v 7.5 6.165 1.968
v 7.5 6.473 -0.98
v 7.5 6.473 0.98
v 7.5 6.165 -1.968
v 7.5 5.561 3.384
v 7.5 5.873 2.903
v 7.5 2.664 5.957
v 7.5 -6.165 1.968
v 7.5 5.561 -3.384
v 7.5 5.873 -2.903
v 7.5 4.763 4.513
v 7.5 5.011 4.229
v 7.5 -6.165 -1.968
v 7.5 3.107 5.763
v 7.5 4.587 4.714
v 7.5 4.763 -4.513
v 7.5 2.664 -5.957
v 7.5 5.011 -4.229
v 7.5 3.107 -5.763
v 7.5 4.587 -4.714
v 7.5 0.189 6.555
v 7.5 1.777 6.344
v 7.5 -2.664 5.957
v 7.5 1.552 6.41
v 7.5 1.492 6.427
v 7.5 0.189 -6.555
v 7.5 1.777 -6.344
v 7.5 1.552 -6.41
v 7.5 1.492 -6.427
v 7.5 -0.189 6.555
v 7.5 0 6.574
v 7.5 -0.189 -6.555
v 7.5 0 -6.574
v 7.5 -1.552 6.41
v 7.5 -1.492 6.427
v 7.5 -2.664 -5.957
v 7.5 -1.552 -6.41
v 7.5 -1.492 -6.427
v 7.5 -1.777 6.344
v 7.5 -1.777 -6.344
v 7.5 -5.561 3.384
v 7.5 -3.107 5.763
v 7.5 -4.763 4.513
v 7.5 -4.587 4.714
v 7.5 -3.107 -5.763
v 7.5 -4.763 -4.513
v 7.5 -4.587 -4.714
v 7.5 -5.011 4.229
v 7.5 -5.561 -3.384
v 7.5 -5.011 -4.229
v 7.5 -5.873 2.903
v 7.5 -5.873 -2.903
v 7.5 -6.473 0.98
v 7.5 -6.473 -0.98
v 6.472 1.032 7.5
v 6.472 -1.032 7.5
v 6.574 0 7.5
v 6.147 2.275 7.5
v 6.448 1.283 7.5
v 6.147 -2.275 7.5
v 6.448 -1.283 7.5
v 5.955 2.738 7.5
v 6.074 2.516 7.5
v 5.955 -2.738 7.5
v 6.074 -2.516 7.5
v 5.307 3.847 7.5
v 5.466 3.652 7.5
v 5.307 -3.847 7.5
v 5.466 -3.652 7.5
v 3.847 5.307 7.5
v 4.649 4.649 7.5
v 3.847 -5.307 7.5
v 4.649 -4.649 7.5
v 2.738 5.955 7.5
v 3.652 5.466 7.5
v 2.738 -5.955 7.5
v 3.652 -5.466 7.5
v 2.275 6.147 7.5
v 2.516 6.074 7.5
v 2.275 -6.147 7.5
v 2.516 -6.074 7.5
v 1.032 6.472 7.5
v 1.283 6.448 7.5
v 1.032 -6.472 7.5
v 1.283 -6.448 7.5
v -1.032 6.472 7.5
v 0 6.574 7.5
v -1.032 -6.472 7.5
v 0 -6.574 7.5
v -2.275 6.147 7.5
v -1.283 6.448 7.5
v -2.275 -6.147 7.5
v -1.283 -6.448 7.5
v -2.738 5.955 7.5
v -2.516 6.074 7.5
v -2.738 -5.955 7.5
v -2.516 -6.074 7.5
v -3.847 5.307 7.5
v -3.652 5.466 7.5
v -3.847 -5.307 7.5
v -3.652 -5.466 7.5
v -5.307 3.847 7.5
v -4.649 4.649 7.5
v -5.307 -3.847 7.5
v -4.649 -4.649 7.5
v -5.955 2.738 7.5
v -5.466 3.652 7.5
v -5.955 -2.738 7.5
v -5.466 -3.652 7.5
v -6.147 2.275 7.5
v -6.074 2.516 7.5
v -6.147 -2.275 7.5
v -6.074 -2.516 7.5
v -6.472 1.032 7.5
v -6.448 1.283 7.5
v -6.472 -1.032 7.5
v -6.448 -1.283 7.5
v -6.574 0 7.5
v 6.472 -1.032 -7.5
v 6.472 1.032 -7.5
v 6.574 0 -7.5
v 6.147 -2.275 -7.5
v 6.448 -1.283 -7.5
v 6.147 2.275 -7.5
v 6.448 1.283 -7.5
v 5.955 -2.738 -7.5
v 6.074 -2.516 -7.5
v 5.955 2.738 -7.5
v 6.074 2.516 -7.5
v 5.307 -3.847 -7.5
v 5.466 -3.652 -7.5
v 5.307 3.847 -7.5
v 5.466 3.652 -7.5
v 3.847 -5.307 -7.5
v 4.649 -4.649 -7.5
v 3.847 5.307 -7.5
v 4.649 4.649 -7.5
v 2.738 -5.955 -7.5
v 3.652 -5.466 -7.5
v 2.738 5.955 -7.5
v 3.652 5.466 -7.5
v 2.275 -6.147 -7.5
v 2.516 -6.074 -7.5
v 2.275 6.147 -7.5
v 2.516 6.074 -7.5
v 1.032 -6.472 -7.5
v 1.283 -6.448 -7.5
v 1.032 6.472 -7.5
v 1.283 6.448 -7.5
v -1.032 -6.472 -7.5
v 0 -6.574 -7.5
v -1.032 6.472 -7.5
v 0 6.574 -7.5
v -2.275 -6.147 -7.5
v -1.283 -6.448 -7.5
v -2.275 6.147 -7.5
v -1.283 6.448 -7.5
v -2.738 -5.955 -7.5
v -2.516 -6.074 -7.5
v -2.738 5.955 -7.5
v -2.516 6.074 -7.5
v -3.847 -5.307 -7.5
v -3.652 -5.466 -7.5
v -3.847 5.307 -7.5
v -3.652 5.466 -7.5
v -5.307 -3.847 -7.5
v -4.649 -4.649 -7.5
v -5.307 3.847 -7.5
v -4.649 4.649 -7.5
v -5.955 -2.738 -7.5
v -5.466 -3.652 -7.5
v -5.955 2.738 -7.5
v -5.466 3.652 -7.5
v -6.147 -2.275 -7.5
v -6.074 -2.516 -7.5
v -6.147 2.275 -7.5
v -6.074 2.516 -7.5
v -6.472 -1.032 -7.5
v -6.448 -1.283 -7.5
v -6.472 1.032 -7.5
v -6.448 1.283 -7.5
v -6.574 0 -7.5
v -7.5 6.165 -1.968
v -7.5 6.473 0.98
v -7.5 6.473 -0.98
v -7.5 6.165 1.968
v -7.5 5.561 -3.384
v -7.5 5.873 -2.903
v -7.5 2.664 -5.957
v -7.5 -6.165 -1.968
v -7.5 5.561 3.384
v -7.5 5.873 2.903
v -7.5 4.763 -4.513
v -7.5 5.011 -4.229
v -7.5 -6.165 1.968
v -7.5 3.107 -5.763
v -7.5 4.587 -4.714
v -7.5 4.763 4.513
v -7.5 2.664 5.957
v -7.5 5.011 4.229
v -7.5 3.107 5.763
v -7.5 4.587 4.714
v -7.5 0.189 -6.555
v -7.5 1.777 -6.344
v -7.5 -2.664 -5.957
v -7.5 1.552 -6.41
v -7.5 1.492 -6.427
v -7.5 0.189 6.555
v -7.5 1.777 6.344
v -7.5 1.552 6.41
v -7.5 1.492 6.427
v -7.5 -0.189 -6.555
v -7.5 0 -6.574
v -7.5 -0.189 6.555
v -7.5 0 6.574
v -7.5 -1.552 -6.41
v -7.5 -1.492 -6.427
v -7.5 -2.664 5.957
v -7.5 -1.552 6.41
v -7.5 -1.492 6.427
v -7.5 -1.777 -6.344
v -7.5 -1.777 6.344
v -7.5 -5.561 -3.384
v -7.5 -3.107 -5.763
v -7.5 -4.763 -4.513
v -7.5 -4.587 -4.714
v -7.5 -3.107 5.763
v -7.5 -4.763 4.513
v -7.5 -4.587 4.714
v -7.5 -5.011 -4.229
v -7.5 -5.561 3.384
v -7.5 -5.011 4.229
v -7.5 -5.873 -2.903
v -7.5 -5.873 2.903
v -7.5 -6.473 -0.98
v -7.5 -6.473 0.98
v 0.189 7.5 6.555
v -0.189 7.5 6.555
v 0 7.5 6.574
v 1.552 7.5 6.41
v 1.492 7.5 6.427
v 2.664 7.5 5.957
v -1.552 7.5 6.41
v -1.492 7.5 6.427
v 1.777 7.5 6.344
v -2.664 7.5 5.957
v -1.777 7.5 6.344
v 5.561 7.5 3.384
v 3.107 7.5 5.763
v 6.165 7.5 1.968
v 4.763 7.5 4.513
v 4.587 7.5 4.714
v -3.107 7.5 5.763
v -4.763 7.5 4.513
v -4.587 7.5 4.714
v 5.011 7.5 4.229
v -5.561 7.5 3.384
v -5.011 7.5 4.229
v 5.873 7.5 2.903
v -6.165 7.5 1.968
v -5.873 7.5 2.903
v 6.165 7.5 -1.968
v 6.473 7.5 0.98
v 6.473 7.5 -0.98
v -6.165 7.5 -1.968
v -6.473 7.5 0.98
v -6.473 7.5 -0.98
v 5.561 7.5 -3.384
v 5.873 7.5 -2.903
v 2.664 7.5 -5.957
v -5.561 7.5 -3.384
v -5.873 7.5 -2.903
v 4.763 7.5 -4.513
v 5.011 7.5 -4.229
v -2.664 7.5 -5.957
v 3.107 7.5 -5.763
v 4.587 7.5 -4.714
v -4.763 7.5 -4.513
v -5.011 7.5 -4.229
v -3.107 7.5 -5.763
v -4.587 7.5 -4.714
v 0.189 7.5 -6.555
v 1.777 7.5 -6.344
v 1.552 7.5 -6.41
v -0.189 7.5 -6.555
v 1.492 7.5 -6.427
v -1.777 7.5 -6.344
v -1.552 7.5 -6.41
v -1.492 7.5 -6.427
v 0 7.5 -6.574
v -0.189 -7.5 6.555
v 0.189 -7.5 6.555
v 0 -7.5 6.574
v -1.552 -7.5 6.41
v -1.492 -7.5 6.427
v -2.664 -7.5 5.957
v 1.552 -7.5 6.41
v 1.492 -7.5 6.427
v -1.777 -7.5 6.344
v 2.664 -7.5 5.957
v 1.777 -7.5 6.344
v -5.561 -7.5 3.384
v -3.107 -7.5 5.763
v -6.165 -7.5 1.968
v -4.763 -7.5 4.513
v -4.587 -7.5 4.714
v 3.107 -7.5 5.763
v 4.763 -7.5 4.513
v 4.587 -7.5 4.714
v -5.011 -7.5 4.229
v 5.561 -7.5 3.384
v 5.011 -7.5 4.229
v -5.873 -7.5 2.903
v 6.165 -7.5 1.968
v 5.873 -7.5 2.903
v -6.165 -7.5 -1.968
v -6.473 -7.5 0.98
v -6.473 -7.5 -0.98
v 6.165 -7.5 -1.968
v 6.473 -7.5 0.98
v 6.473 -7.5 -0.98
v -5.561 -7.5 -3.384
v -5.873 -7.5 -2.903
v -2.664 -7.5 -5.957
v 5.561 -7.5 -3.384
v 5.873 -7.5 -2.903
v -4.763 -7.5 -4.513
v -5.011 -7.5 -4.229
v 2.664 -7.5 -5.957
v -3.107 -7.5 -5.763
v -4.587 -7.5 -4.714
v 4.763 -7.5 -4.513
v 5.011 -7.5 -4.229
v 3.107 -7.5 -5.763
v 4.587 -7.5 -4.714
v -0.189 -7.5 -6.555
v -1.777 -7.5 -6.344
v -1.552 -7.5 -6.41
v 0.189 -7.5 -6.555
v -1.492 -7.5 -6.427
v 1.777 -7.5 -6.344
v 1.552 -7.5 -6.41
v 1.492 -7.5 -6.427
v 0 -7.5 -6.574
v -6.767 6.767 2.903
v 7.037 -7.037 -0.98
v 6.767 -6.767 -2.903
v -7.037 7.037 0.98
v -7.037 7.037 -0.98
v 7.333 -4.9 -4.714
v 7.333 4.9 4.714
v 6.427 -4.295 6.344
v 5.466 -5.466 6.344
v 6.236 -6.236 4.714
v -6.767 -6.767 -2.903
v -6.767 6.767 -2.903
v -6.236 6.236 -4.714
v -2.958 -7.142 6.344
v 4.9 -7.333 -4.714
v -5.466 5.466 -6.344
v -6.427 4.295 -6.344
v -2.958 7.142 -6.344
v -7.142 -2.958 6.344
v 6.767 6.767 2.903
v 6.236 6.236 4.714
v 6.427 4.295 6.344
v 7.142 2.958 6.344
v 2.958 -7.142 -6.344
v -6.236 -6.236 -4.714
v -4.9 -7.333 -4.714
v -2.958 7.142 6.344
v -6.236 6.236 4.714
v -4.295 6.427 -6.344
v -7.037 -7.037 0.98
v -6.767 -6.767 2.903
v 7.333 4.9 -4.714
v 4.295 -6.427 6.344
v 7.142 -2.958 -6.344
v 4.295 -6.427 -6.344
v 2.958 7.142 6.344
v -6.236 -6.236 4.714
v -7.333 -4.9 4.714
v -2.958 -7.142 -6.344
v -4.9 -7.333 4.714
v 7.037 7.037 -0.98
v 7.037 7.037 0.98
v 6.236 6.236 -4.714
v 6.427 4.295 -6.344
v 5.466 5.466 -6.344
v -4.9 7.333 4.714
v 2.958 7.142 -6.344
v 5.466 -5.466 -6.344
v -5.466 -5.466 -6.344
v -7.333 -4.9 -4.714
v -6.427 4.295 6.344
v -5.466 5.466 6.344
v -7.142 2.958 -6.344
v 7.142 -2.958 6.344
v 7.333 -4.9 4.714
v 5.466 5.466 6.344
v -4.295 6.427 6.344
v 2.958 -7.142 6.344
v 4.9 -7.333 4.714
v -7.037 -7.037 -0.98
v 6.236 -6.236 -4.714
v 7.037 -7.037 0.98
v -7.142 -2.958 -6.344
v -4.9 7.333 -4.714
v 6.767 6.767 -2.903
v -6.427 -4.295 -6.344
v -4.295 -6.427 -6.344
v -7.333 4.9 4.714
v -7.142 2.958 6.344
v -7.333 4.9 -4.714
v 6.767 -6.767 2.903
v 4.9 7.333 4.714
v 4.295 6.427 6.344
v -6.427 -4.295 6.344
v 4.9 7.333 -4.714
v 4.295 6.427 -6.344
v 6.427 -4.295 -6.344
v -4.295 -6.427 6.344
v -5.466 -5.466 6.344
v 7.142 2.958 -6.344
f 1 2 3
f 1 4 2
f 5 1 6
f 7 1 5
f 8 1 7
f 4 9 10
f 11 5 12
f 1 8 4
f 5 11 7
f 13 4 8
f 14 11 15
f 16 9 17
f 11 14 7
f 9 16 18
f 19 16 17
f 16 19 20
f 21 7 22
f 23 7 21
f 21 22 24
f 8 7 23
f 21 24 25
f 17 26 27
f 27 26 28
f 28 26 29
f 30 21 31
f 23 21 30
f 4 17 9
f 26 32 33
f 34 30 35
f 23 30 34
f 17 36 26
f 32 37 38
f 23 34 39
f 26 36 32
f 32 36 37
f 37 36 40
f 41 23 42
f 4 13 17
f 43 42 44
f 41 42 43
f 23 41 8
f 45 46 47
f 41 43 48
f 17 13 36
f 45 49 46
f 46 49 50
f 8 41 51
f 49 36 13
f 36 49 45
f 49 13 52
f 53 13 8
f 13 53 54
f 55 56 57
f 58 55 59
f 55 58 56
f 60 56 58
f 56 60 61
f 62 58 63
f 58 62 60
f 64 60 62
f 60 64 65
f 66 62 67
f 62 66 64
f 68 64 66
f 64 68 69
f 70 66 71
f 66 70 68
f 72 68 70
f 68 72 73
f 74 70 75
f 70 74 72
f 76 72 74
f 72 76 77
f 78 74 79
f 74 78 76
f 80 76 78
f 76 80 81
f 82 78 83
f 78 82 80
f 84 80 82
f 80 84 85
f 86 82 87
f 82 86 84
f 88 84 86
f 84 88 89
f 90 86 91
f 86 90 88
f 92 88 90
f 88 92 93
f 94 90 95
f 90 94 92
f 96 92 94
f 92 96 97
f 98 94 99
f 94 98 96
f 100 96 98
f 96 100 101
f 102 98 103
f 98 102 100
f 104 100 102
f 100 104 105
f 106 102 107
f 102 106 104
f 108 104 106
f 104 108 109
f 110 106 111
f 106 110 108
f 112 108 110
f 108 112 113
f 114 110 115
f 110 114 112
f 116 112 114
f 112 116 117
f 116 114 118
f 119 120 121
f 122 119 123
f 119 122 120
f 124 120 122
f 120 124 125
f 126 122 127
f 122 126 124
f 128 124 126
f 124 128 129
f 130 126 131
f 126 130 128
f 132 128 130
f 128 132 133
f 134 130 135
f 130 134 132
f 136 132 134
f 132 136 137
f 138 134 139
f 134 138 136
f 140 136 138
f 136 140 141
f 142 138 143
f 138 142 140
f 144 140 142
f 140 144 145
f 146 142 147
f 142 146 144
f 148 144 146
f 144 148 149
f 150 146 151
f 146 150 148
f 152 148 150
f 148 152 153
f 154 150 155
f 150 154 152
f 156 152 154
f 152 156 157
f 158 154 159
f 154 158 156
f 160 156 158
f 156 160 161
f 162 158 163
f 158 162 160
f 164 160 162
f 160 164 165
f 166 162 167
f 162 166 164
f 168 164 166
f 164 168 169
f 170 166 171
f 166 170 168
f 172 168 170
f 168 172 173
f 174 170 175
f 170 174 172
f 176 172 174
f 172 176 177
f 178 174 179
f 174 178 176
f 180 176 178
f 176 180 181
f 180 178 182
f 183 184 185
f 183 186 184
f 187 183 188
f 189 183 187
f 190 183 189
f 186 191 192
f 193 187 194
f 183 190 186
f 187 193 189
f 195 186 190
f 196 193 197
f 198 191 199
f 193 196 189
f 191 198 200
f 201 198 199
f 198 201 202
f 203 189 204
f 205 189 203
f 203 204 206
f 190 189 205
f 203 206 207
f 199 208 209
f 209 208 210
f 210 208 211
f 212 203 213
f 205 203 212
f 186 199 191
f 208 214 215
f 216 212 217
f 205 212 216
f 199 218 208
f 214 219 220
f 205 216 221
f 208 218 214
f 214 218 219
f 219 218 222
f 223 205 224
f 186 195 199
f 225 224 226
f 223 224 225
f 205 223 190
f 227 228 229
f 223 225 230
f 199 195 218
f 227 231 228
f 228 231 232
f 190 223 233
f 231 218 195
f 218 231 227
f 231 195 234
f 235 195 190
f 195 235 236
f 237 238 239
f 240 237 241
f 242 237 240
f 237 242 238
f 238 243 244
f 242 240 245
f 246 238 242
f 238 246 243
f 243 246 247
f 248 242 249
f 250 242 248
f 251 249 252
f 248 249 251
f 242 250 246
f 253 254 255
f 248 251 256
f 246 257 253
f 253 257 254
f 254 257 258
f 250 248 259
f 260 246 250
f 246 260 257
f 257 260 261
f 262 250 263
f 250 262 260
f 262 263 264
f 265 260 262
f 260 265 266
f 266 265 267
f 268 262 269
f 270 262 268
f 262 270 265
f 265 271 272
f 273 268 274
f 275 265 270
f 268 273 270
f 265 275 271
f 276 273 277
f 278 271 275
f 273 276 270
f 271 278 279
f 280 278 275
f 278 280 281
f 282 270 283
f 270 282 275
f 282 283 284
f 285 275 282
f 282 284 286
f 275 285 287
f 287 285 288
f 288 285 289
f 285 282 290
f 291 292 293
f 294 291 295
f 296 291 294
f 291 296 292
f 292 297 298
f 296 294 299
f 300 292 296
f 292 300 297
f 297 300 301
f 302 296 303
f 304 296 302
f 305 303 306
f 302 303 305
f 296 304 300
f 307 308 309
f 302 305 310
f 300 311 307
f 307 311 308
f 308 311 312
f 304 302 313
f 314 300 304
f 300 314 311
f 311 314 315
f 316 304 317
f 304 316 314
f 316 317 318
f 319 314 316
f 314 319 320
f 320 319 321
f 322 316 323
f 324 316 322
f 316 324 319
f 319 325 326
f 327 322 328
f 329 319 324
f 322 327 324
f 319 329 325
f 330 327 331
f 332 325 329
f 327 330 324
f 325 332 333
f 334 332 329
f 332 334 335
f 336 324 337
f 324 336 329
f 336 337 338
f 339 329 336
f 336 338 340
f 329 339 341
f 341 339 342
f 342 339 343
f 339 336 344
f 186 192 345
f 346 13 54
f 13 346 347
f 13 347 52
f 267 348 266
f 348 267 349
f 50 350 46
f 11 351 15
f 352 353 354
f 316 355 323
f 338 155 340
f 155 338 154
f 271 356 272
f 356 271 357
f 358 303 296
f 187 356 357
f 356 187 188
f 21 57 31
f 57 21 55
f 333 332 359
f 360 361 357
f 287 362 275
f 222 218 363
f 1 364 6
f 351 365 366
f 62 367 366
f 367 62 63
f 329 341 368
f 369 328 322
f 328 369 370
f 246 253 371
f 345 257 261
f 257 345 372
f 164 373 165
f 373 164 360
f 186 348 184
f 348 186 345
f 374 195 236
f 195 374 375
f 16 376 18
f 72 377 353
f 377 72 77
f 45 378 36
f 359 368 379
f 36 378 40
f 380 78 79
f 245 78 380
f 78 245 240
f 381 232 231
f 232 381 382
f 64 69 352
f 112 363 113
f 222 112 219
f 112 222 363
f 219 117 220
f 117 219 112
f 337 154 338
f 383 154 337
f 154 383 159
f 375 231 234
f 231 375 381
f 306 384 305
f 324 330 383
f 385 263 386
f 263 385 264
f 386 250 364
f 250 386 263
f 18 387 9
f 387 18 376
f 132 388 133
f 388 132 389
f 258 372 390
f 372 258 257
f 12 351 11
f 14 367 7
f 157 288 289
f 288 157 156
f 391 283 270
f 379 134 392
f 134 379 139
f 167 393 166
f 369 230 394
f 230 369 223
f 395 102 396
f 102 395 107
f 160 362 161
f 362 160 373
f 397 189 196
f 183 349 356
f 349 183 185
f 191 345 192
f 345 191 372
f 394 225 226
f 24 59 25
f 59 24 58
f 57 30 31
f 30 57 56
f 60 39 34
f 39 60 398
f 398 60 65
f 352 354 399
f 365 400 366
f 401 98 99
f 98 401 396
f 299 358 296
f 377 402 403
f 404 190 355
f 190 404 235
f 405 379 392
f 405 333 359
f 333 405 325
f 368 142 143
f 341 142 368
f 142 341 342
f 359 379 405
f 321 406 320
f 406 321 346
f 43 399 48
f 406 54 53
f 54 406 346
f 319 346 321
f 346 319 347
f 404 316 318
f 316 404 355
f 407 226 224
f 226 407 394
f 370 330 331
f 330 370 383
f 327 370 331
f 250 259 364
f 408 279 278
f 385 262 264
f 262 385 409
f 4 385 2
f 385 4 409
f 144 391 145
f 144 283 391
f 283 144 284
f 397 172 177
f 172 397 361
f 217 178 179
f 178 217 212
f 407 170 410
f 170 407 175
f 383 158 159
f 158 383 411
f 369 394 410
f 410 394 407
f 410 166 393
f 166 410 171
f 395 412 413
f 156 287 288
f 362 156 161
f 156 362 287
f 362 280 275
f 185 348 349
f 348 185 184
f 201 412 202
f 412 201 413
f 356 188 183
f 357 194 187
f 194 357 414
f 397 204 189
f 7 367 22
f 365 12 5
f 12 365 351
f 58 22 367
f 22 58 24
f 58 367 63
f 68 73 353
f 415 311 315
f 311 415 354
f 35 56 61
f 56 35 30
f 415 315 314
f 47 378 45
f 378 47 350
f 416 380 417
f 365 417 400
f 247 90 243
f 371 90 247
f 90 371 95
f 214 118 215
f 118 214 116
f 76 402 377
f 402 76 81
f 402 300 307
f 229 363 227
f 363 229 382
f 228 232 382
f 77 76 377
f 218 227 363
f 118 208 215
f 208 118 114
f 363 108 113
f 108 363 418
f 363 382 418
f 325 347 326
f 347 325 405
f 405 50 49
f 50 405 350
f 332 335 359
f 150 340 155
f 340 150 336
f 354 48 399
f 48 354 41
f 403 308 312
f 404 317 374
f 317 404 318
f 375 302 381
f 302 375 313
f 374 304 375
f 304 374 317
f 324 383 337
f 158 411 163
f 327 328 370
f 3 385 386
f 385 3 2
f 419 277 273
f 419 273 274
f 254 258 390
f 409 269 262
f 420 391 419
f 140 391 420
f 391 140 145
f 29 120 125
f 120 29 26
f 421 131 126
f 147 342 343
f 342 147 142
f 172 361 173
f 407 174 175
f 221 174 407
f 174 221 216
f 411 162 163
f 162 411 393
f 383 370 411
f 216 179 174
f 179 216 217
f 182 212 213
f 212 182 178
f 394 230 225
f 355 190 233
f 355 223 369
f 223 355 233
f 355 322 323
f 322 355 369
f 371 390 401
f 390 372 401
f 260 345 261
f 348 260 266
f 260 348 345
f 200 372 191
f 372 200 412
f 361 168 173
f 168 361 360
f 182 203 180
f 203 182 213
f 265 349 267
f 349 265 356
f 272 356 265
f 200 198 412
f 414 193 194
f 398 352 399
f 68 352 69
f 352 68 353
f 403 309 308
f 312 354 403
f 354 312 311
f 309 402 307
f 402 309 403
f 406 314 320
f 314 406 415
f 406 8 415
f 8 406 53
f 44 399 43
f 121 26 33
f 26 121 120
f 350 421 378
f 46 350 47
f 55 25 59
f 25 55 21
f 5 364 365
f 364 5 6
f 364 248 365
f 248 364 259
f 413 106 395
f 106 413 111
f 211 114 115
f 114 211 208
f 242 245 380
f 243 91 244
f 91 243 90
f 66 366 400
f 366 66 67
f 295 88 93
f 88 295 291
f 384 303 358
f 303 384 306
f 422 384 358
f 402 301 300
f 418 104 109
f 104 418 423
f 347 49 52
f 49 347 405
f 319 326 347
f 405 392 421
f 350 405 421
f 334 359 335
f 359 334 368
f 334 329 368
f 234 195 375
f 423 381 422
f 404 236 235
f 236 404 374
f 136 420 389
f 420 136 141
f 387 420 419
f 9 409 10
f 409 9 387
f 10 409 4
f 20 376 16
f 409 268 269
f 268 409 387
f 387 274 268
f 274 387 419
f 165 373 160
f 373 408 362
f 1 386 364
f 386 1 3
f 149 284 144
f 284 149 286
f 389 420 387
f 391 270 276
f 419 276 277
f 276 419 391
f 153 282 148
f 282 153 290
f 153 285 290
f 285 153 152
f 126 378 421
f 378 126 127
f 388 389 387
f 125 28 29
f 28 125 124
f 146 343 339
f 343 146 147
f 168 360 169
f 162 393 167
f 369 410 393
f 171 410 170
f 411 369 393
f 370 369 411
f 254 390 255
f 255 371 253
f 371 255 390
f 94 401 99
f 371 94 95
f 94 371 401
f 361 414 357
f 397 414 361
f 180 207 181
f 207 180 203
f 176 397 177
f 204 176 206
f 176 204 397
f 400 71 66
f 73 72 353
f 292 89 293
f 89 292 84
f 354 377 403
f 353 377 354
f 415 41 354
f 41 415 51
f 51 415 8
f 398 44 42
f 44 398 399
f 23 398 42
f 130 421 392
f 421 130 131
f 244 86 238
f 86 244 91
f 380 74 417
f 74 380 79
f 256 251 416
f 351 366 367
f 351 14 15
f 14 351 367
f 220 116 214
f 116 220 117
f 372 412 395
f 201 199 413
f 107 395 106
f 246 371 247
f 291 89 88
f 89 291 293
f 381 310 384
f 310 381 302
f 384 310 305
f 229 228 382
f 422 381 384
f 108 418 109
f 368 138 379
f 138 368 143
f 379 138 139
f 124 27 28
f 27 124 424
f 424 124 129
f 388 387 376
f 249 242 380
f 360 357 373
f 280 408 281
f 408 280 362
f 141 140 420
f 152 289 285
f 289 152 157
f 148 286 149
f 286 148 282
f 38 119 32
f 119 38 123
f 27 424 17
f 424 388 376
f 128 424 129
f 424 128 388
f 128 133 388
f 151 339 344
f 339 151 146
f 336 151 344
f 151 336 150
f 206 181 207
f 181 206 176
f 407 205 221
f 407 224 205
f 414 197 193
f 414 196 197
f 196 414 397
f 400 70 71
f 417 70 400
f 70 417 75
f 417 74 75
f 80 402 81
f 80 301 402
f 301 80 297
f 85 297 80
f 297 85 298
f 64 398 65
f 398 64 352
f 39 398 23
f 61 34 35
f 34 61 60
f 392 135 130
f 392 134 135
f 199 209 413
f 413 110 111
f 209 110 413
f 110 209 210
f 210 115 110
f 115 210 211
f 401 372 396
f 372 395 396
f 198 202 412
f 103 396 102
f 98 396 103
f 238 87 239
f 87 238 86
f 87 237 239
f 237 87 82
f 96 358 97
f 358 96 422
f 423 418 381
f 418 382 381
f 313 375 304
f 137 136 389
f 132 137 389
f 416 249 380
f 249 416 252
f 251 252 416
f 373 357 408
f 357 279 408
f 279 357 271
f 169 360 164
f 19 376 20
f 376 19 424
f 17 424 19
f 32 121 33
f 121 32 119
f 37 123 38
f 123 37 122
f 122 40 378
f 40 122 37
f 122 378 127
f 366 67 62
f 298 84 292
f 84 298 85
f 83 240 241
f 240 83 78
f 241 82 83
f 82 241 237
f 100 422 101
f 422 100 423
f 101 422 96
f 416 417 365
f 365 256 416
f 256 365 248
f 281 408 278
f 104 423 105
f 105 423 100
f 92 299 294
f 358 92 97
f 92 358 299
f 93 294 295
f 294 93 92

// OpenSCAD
// Intersection of cube and sphere
intersection() {
    cube(15, center=true);
    sphere(r=10, $fn=32);
}
